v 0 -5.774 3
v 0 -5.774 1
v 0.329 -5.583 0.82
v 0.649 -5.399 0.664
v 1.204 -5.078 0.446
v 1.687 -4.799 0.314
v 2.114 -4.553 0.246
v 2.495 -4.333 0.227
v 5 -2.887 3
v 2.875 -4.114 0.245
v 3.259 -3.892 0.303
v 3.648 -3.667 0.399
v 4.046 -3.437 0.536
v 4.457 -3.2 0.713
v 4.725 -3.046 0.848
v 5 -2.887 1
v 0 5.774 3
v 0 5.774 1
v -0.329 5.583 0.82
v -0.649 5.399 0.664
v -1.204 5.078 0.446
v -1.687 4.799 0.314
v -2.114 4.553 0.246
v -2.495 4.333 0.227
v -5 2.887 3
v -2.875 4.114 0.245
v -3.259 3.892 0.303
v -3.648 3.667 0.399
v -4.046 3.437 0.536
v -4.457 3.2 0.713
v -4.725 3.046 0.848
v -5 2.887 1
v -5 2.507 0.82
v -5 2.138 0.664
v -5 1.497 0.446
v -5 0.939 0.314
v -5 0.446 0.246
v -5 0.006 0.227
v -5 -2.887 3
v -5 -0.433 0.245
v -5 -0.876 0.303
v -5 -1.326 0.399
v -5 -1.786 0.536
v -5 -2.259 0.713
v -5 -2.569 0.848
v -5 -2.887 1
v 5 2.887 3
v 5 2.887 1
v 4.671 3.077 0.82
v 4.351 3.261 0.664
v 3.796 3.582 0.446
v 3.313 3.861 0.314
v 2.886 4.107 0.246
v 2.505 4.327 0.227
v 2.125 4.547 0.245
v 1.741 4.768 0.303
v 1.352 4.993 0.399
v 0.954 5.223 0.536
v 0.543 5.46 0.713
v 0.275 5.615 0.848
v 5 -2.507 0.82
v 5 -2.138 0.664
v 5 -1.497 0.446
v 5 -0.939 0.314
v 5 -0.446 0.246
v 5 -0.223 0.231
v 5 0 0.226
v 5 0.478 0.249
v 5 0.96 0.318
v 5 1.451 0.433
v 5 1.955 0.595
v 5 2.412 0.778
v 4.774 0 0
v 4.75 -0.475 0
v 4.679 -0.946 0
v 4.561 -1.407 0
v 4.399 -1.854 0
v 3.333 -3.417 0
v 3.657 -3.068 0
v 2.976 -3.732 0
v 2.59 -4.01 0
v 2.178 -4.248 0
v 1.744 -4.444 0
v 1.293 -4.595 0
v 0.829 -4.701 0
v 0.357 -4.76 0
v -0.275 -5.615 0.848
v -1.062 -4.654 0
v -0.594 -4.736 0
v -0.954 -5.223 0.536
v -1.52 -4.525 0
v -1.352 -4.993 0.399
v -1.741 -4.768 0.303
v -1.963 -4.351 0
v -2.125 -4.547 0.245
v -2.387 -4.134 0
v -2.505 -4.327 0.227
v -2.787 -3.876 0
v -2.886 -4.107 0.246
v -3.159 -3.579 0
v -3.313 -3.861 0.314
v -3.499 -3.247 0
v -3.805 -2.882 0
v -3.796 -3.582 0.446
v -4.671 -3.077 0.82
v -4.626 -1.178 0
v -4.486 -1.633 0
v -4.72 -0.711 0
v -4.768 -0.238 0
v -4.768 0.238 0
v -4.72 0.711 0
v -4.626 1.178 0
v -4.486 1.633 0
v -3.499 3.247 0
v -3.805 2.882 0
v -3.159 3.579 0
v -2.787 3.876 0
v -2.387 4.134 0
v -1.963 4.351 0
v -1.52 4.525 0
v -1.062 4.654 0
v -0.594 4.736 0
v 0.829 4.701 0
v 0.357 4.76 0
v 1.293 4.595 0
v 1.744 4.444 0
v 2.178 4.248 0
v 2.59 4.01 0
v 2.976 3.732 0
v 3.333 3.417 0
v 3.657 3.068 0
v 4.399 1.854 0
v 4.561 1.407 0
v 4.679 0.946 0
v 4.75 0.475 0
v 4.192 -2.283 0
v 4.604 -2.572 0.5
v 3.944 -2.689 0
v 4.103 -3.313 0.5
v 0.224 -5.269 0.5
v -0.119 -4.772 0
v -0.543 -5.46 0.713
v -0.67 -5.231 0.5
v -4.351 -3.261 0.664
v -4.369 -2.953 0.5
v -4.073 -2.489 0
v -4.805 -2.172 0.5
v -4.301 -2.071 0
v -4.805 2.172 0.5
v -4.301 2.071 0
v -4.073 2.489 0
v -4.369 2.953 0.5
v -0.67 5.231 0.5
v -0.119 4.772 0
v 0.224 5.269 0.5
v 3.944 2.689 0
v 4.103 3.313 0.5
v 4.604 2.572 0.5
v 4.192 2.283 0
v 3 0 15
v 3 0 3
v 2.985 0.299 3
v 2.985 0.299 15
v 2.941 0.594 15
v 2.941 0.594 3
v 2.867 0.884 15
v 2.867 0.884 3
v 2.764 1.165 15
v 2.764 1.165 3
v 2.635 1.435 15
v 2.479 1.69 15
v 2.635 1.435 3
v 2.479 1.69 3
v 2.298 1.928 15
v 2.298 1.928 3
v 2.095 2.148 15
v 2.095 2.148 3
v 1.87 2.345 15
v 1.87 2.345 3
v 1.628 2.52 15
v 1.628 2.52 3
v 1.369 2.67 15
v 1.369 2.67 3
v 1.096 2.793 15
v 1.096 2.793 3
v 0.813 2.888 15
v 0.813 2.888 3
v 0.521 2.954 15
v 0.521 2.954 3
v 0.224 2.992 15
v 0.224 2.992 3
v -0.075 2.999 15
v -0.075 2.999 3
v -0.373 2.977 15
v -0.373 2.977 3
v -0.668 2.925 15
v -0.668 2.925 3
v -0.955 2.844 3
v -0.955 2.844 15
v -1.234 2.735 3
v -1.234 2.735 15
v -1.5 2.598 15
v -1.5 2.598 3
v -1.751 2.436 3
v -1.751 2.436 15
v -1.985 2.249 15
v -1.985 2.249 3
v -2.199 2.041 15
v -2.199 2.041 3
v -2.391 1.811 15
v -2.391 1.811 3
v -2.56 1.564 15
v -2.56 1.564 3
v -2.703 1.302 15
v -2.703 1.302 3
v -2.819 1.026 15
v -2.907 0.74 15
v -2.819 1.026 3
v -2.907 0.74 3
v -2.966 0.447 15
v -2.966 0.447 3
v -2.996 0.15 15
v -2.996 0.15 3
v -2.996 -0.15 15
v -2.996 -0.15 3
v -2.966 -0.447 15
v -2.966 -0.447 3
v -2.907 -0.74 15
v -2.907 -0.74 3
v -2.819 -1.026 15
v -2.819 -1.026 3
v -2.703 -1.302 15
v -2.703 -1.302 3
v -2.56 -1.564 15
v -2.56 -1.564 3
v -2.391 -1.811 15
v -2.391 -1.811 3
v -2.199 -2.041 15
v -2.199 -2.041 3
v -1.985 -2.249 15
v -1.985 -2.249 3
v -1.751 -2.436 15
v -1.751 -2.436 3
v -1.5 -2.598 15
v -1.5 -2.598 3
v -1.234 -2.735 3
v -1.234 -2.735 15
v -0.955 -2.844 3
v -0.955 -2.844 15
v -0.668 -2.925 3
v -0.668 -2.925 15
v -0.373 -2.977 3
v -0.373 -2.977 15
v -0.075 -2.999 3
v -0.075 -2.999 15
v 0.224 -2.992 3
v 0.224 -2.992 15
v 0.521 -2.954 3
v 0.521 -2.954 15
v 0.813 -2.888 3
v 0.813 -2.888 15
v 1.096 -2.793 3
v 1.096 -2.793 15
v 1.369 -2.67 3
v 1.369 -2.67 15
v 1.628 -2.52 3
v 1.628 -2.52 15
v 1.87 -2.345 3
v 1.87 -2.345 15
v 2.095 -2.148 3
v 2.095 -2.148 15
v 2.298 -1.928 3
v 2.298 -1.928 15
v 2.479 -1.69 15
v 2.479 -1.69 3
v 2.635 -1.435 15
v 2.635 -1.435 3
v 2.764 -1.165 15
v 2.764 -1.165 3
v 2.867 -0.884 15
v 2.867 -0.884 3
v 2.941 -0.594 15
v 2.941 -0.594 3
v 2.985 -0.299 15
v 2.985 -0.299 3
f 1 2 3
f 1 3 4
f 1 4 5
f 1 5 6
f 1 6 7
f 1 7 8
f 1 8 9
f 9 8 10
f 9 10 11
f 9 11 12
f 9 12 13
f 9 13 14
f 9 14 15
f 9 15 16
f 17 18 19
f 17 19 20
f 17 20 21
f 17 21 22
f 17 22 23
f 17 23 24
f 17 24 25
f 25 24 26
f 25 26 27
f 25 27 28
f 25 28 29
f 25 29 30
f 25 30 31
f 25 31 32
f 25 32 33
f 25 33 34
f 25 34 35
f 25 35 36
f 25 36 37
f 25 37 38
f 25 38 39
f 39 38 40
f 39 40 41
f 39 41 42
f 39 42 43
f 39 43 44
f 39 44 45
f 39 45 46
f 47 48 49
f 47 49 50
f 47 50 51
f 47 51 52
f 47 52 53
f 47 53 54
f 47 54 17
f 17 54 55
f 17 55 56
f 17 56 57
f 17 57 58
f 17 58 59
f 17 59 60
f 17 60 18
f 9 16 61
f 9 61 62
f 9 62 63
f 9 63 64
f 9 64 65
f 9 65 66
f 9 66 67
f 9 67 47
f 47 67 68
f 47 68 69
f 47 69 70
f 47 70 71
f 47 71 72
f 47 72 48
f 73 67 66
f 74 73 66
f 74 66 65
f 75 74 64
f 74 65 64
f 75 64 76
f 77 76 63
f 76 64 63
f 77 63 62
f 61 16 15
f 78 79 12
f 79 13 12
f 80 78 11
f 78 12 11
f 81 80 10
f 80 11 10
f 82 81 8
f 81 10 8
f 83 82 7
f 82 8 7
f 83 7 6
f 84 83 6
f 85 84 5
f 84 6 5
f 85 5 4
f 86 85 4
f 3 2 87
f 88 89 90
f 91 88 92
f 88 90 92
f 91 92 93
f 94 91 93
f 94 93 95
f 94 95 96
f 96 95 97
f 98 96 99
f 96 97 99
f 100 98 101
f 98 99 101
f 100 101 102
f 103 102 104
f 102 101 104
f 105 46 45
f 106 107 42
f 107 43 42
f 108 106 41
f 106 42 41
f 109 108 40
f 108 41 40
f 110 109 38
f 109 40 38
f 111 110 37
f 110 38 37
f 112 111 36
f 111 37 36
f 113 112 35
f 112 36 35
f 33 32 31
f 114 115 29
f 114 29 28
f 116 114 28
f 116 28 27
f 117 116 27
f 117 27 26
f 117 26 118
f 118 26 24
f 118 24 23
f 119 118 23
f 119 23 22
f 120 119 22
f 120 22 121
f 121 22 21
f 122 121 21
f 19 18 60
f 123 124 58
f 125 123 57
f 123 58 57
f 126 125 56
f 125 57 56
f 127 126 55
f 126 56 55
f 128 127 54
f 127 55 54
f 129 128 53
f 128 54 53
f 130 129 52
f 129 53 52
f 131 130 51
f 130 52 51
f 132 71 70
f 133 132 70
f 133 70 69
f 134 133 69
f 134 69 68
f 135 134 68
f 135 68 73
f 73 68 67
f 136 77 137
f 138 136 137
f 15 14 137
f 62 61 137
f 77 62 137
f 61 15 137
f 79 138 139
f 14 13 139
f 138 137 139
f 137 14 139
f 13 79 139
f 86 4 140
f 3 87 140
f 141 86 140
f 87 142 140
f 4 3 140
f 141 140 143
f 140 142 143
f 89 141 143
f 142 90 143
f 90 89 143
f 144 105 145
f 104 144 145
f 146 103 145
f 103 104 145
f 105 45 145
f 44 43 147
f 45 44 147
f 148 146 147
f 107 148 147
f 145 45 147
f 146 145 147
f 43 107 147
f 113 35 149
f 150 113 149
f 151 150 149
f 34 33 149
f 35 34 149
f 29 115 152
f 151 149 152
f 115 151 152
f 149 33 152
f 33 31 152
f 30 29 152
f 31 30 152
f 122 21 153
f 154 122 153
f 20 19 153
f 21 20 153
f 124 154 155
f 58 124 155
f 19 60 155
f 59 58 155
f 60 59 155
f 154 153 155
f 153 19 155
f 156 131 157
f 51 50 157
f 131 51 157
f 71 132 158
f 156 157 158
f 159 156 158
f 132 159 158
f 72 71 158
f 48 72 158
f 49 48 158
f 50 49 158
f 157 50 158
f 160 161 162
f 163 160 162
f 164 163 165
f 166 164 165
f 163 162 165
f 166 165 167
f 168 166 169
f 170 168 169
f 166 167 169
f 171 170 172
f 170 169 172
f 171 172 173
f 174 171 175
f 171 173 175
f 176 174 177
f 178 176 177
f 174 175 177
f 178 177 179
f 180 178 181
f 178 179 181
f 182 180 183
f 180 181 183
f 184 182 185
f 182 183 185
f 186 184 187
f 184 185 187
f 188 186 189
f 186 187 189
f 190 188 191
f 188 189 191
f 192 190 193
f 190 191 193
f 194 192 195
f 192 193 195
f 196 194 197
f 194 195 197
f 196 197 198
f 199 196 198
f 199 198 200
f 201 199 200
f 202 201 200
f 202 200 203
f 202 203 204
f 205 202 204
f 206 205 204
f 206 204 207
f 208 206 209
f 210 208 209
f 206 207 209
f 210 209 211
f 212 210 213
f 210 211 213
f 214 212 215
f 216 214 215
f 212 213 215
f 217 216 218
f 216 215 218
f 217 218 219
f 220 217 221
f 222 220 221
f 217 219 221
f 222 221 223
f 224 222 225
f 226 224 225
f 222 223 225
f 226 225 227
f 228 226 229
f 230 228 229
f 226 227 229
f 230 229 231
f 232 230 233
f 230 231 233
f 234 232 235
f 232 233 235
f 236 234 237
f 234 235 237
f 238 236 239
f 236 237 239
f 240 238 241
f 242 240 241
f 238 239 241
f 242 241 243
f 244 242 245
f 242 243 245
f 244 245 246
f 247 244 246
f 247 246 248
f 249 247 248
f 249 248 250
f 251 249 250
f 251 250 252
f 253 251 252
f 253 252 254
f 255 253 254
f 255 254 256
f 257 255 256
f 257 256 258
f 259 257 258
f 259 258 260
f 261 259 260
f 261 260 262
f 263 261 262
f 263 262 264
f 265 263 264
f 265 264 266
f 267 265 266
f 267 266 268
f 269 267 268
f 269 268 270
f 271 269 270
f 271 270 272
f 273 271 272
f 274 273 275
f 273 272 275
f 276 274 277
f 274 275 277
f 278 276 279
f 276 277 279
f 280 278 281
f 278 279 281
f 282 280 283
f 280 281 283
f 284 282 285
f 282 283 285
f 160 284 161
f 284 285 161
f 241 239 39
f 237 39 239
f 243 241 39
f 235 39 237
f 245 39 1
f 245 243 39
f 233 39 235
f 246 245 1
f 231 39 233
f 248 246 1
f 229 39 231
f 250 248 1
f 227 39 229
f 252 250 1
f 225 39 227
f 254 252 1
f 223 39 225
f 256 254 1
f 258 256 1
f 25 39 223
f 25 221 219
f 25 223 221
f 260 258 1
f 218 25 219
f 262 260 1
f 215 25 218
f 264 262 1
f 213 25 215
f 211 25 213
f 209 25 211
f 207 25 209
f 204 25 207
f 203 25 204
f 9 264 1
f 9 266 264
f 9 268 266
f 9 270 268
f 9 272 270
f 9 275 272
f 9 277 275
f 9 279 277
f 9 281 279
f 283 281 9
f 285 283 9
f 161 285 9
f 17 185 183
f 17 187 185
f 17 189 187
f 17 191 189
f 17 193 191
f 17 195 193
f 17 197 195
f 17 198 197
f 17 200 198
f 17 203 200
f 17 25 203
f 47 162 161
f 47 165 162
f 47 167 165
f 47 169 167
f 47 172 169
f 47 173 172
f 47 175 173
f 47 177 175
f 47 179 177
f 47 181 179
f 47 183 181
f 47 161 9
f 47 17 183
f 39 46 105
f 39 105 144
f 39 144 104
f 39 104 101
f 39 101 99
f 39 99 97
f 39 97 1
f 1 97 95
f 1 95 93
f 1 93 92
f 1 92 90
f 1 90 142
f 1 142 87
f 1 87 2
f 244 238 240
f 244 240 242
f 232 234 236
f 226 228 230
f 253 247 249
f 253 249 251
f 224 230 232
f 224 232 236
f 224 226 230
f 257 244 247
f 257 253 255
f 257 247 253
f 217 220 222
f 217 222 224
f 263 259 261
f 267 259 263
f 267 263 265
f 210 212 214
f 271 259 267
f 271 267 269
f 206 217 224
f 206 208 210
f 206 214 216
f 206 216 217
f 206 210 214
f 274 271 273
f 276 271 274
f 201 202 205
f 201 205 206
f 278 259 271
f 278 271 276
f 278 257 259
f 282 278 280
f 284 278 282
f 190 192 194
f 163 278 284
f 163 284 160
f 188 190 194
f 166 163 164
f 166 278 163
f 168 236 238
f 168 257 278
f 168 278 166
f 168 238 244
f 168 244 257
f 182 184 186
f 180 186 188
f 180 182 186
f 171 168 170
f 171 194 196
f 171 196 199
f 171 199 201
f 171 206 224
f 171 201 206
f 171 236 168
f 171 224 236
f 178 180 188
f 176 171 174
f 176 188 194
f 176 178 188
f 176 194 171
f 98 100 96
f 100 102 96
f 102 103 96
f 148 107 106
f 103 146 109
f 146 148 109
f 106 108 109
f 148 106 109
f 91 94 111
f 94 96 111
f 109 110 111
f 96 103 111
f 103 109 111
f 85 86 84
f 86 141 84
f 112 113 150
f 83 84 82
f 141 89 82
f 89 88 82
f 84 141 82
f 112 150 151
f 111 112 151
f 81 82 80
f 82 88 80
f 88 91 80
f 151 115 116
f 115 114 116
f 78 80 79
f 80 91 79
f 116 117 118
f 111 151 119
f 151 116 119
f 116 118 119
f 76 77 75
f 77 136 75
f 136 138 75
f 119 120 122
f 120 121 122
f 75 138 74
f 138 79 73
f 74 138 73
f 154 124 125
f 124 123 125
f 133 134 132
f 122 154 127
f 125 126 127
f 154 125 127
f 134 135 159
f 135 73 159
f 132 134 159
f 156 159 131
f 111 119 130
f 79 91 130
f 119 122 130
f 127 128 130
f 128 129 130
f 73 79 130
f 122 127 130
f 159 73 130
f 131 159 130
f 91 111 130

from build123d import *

# Parameters (mm, degrees)
BOSS_EXTRUDE1_DEPTH = 3
SKETCH2_R           = 3
BOSS_EXTRUDE2_DEPTH = 12


with BuildPart() as part:
    # Sketch1 → Boss-Extrude1 (new body)
    with BuildSketch(Plane.XY):
        Polygon((0, -5.773502692), (5, -2.886751346), (5, 2.886751346), (0, 5.773502692), (-5, 2.886751346), (-5, -2.886751346), align=None)
    extrude(amount=BOSS_EXTRUDE1_DEPTH)

    # Sketch2 → Boss-Extrude2 (add)
    with BuildSketch(Plane.XY.offset(3)):
        Circle(SKETCH2_R)
    extrude(amount=BOSS_EXTRUDE2_DEPTH)

    # Sketch3 → Cut-Revolve1 (revolve, cut)
    with BuildSketch(Plane(origin=(0, 0, 0), x_dir=(0, 0, -1), z_dir=(1, 0, 0)), mode=Mode.PRIVATE) as cut_revolve1_sk:
        Polygon((-1, 5.773502692), (0, 5.773502692), (0, 4.773502692), align=None)
    revolve(cut_revolve1_sk.sketch.rotate(Axis((0, 0, 11.168529758), (0, 0, -1)), 90), axis=Axis((0, 0, 11.168529758), (0, 0, -1)), mode=Mode.SUBTRACT)


solid = part.part
